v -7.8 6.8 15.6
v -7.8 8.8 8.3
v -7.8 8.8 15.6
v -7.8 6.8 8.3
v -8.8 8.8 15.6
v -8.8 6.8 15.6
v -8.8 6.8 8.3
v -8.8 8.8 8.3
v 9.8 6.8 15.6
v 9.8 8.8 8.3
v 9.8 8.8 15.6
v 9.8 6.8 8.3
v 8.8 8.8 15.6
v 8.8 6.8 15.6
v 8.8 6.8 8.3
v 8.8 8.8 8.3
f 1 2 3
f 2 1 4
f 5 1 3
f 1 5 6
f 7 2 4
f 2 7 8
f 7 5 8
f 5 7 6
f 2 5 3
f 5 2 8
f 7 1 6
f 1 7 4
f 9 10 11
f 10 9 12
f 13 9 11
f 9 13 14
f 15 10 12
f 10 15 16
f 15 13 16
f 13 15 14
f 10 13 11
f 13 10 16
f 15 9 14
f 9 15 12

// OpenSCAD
// Original isolated carrier tab expression, not supplier/electronic geometry.
for(x=[-8.8,8.8]) translate([x,6.8,8.3]) cube([1,2,7.3]);
// Maximum pack X range -7.75..7.75 mm.
